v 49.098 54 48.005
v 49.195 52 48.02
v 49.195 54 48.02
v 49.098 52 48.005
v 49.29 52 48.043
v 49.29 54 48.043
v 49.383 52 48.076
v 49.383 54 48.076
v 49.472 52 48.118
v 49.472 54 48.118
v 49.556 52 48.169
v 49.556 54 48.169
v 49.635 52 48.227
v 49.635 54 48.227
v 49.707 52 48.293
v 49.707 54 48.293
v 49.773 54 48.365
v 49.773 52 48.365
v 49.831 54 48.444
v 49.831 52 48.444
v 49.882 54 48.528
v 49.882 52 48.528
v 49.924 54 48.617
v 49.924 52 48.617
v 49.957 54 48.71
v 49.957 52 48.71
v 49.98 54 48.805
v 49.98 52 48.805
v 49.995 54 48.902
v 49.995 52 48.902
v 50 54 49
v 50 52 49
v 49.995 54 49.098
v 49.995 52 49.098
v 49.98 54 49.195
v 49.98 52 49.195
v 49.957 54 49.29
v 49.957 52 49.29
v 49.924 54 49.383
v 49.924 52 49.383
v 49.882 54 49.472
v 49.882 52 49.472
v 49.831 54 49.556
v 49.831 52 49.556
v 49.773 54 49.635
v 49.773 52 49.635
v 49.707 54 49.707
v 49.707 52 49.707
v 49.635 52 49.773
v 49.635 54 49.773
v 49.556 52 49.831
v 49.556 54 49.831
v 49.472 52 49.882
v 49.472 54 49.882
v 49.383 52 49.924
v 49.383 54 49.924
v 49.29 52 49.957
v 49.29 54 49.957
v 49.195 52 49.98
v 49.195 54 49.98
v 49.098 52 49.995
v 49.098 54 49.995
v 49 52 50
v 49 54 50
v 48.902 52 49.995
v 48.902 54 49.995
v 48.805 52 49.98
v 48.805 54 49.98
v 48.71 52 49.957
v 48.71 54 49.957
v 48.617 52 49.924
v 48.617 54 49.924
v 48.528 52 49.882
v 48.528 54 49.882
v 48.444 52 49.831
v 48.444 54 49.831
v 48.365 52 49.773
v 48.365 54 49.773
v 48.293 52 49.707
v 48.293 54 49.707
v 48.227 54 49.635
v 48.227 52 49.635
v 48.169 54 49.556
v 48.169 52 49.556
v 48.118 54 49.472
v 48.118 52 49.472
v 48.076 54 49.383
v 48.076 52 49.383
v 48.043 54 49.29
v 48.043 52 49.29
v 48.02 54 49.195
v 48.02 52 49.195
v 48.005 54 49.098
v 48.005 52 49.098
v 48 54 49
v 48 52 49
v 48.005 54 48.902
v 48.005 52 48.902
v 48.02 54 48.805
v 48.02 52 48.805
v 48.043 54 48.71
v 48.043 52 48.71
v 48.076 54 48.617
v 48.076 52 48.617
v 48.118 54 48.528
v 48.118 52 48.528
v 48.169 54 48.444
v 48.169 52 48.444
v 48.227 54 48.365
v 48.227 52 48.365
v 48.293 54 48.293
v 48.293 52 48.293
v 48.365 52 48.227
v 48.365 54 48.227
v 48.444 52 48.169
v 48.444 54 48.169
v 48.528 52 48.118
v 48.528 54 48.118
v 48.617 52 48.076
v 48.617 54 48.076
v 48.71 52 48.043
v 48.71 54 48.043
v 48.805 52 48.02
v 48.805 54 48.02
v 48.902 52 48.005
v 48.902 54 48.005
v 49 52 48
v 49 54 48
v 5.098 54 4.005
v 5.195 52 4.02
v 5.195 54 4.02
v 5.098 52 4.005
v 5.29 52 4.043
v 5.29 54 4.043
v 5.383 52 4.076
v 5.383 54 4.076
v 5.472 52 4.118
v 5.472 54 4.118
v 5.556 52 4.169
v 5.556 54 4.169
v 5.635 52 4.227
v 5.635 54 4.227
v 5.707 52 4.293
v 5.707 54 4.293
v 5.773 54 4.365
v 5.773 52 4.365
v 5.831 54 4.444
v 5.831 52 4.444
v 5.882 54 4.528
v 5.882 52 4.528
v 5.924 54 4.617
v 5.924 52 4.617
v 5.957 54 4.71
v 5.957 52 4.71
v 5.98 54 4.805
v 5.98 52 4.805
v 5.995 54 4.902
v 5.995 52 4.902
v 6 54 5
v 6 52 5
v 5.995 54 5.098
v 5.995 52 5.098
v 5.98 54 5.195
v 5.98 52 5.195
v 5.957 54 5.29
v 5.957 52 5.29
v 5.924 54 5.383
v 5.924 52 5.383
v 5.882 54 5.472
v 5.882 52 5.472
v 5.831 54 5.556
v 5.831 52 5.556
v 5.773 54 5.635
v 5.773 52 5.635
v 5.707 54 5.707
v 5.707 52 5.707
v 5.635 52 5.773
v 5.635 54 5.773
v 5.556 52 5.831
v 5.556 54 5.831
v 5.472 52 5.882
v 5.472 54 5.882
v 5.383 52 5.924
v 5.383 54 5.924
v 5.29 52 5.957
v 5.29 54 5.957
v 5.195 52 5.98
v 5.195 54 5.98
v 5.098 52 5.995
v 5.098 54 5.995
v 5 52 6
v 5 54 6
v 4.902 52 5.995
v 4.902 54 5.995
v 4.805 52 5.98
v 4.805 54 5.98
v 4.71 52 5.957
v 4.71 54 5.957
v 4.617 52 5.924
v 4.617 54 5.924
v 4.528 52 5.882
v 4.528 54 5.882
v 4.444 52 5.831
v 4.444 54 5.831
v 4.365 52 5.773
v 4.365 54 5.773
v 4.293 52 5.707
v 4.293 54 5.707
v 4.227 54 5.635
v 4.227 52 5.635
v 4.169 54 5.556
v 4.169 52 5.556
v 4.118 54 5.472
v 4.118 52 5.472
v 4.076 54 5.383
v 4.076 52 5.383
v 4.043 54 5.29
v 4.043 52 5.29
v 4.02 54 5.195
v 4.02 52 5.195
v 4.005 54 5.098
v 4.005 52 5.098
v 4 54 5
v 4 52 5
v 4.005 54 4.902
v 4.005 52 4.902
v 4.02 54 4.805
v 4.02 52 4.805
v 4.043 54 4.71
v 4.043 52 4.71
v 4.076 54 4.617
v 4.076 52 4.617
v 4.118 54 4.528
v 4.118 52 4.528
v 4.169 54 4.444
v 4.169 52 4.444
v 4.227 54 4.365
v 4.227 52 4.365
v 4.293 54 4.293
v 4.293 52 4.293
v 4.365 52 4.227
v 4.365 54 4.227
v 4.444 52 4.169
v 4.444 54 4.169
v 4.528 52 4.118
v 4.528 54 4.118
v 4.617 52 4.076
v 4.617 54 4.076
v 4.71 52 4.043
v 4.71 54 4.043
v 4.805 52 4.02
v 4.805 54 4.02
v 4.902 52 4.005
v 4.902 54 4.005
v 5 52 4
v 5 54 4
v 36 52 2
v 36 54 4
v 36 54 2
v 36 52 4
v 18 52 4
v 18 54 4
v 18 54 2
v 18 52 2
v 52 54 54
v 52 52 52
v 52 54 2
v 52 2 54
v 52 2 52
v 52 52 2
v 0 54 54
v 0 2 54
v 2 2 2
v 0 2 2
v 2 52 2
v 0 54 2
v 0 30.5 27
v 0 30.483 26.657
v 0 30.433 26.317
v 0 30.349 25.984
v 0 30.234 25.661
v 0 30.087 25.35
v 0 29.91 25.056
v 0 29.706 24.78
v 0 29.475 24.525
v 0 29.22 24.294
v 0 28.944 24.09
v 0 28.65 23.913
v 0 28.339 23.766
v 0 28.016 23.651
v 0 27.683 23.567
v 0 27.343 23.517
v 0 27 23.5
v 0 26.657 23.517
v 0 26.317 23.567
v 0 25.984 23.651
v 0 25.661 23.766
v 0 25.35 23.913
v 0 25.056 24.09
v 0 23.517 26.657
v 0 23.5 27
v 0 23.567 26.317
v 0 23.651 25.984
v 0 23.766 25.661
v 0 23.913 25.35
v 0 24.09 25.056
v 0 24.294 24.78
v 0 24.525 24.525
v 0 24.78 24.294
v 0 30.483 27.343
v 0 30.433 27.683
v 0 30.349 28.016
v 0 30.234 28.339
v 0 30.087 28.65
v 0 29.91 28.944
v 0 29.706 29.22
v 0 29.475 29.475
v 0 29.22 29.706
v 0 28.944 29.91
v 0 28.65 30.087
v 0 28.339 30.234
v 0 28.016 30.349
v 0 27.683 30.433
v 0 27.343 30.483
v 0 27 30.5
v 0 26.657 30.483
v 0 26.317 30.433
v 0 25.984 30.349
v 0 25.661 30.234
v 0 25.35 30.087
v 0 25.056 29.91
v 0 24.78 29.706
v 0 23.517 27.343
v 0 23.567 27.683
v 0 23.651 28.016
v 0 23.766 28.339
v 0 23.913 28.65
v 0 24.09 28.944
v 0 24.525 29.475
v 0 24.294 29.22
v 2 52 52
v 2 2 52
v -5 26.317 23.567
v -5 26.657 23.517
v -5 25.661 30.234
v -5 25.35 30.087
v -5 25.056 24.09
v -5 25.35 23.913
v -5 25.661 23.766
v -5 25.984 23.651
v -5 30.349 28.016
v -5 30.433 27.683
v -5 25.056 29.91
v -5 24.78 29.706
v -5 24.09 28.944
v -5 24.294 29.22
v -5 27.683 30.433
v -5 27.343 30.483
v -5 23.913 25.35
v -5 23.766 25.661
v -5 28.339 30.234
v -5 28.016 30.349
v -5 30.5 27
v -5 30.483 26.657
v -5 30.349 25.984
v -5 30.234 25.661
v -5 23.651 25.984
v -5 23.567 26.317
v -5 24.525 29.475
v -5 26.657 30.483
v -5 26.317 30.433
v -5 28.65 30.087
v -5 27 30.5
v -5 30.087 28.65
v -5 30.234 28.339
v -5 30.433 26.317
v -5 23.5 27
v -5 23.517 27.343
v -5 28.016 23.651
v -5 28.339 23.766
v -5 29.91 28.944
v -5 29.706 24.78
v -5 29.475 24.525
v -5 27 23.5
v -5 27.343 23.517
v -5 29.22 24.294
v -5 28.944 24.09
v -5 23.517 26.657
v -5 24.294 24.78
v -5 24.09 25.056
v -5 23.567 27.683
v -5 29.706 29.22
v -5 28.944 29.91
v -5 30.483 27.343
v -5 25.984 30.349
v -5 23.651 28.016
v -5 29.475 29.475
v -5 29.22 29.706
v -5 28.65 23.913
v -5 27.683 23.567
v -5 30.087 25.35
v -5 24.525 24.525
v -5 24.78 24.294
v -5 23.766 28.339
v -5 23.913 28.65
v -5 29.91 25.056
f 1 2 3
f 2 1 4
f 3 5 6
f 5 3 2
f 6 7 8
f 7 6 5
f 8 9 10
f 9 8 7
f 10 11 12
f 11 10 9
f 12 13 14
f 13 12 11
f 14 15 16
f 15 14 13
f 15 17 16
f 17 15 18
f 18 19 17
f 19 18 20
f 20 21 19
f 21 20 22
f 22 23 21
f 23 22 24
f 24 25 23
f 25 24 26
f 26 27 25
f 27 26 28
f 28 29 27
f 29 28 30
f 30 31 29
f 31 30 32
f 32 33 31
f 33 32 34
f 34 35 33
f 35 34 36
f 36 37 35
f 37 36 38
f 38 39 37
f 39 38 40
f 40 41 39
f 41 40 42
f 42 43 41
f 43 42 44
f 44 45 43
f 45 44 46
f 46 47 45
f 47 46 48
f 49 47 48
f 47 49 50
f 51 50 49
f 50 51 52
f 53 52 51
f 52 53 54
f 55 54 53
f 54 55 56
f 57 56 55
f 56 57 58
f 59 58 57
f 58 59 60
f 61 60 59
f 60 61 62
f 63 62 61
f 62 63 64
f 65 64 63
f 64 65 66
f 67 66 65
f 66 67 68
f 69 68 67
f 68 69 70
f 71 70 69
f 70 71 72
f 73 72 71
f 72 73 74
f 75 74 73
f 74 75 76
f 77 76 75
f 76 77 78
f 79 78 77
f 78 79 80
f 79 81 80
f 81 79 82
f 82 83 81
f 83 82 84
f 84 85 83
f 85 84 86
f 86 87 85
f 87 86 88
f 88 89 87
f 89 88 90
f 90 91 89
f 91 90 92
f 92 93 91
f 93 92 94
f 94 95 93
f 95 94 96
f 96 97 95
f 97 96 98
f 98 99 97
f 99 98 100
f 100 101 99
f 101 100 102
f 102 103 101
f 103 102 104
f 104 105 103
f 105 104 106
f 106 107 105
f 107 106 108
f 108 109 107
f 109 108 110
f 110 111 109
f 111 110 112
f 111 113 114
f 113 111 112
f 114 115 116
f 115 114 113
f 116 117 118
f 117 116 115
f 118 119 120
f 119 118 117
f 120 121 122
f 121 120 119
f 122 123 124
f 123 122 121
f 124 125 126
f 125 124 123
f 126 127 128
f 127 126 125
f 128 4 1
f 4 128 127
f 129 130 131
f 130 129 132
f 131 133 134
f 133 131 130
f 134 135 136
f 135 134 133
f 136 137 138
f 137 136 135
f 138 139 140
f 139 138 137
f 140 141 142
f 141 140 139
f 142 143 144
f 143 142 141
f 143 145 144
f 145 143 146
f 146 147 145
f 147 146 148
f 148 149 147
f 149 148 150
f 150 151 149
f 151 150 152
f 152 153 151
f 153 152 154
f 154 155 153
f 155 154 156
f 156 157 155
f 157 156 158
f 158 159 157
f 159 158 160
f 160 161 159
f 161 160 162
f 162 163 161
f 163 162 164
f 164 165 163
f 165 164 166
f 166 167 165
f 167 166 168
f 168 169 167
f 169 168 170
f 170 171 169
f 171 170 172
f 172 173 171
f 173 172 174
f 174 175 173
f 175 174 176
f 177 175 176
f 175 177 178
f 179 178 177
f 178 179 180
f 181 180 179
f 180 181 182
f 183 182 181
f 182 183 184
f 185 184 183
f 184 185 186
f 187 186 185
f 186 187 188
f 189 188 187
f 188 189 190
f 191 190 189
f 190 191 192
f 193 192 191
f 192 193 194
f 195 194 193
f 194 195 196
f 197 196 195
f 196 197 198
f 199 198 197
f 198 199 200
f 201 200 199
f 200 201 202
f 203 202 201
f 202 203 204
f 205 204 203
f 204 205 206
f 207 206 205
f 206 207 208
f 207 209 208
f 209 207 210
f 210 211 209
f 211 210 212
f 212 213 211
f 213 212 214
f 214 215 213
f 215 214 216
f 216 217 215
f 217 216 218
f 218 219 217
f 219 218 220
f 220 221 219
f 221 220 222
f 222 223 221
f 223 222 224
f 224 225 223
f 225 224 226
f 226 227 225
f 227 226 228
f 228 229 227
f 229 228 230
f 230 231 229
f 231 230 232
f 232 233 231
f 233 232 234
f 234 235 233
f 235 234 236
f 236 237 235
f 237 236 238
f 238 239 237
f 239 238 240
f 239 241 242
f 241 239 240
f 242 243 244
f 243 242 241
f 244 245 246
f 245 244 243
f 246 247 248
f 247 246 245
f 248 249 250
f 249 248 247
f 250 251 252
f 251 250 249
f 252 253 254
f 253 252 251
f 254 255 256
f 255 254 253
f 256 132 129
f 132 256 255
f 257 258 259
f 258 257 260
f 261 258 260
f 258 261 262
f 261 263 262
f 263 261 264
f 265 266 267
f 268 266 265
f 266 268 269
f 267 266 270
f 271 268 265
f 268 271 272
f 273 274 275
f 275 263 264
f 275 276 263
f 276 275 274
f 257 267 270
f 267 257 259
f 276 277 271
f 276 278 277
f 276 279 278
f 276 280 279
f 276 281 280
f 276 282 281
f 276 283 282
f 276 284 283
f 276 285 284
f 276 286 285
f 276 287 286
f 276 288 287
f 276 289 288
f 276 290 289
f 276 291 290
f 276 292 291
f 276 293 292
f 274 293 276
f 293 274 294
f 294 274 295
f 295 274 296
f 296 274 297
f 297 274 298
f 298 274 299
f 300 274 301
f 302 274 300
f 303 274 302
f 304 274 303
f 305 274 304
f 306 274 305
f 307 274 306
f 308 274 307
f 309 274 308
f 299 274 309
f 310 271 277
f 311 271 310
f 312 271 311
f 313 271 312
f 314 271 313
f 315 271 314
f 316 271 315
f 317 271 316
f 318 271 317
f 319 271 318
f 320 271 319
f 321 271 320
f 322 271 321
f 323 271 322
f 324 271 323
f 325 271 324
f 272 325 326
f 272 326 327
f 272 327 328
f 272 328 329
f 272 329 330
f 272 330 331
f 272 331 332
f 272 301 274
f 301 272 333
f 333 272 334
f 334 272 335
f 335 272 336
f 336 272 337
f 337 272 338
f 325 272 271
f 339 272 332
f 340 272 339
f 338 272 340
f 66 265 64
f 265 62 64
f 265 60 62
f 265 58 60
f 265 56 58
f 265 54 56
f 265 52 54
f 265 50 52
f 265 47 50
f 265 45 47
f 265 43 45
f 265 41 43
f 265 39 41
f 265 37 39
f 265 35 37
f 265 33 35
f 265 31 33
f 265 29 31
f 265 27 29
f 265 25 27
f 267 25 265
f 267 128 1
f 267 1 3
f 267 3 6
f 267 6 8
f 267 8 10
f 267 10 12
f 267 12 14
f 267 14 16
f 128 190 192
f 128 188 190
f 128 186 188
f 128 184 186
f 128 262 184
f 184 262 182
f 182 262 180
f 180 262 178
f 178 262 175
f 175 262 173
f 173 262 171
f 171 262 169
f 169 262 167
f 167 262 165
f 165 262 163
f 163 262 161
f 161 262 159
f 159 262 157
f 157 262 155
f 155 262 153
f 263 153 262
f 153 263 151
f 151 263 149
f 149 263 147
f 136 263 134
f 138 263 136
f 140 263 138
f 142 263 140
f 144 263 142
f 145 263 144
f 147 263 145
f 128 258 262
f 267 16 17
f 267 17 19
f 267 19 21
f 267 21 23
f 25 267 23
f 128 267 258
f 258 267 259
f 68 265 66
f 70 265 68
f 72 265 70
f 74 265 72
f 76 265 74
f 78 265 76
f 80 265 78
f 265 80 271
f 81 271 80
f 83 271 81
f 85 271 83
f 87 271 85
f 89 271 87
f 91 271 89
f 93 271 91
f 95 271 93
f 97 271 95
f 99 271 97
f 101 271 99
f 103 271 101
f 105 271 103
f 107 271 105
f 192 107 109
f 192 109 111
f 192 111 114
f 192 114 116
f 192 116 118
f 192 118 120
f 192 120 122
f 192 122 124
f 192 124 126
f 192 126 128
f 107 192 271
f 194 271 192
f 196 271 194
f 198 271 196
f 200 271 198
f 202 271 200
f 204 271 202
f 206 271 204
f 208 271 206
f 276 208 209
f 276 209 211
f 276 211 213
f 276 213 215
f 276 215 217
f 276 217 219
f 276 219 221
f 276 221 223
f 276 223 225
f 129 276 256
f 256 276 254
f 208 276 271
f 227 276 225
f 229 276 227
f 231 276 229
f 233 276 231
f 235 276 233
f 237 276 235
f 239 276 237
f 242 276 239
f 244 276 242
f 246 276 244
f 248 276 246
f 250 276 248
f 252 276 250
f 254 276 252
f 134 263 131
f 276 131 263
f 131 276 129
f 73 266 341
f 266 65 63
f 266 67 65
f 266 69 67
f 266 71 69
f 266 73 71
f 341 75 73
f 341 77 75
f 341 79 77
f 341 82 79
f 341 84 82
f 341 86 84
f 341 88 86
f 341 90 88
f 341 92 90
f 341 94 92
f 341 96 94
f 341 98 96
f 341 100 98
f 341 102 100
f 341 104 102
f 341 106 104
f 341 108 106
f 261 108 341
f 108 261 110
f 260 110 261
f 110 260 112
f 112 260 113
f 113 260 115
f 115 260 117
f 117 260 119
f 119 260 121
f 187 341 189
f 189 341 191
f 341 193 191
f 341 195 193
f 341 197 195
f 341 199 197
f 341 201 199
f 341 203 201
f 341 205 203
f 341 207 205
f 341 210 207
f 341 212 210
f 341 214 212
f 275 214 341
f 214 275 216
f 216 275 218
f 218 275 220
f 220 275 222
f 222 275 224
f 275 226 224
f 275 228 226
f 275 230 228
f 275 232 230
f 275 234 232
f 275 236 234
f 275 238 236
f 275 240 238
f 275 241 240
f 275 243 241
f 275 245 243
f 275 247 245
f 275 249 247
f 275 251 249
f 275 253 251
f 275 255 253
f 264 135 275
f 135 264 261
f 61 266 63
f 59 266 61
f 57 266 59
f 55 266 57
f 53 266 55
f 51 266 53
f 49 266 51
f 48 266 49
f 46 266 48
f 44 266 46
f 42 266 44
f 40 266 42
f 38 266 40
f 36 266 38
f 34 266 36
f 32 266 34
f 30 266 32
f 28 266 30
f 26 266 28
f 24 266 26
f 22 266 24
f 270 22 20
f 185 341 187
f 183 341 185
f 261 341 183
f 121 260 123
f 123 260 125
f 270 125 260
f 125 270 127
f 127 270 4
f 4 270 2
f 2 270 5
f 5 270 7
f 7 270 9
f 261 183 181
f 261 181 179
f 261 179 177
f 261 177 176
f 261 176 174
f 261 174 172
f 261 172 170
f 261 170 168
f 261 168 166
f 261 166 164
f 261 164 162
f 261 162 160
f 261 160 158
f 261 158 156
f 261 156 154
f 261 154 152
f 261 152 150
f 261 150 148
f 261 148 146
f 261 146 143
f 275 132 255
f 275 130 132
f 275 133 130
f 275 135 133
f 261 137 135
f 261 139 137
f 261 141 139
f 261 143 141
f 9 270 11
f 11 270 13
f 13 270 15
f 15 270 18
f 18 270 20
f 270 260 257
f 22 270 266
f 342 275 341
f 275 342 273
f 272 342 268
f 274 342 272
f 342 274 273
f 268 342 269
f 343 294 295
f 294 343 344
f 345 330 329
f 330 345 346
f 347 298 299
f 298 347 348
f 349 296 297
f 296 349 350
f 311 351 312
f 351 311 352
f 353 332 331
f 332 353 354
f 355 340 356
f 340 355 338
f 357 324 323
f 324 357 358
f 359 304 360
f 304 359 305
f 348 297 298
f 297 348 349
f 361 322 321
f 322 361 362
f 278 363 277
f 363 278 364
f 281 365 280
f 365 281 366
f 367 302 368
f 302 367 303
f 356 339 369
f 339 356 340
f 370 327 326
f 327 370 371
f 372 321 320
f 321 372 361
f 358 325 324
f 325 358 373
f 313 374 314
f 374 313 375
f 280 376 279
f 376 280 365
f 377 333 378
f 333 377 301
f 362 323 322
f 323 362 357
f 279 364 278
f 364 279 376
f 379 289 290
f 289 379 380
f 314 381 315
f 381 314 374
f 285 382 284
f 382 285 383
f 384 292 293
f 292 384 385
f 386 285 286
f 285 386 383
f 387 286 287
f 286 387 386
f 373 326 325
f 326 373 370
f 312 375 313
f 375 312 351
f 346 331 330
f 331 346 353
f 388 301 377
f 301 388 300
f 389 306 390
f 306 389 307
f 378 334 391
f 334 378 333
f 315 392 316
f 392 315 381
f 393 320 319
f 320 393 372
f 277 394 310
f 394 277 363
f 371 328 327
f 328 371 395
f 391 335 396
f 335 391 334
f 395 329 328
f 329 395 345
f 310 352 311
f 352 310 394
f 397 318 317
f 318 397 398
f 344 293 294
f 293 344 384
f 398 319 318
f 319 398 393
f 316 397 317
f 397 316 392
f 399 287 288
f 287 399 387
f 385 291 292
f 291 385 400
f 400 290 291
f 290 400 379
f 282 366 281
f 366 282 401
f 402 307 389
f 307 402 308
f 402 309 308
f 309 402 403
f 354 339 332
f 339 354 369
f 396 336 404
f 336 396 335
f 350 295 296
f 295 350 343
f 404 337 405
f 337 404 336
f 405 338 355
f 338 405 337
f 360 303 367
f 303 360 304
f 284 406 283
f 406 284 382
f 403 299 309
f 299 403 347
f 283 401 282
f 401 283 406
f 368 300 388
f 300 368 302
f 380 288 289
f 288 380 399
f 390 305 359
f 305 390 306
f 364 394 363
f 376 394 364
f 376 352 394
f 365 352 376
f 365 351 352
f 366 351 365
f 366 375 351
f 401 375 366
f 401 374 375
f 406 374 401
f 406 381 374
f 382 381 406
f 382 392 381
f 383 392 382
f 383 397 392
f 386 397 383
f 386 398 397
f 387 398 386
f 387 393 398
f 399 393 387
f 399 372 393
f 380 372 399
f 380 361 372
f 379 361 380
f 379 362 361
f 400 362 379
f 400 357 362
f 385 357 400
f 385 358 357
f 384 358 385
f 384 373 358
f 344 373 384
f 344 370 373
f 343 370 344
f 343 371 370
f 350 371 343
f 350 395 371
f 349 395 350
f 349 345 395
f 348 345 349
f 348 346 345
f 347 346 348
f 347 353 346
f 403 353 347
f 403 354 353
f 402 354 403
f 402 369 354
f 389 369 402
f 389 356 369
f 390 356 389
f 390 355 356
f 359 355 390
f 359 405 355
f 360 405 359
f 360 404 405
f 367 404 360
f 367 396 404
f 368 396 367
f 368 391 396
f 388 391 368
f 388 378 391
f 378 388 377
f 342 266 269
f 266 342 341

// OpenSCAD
// Outer width of the "box" that contains the camera
BODY_OUT_W = 54;

// Thickness of the walls of the "box" that contains the camera
PANEL_THICK = 2;

// Margin to apply when performing differences
MARGIN = 1;

// Circles resolution
FN = 64;

// Cable hole dimensions
CABLE_HOLE_W = 18;
CABLE_HOLE_H = 2;

// Axis dimensions
AXIS_H = 5;
AXIS_R = 3.5;

// Back panel
difference () {
translate ([0, BODY_OUT_W - PANEL_THICK, PANEL_THICK]) {
    cube([BODY_OUT_W - PANEL_THICK, PANEL_THICK, BODY_OUT_W - PANEL_THICK]);
}
union () {
translate ([BODY_OUT_W / 2.0, BODY_OUT_W + MARGIN, BODY_OUT_W / 2.0]) {
rotate ([90, 0, 0]) {
linear_extrude(height = PANEL_THICK + MARGIN * 2) {
    import(file = "../drawings/camera.dxf", layer = "openscad-screws-2", $fn=FN);
}
}
}
translate ([BODY_OUT_W / 2 - CABLE_HOLE_W / 2, BODY_OUT_W - PANEL_THICK - MARGIN, PANEL_THICK - MARGIN]) {
cube ([CABLE_HOLE_W, PANEL_THICK + MARGIN * 2, CABLE_HOLE_H + MARGIN]);
}
}
}

// Left panel
translate ([0, PANEL_THICK, PANEL_THICK]) {
    cube([PANEL_THICK, BODY_OUT_W - PANEL_THICK, BODY_OUT_W - PANEL_THICK]);
}
translate ([MARGIN, BODY_OUT_W / 2, BODY_OUT_W / 2]) {
rotate ([0, -90, 0]) {
cylinder (AXIS_H + MARGIN, AXIS_R, AXIS_R, $fn=FN);
}
}

// Top panel
translate ([0, PANEL_THICK, BODY_OUT_W - PANEL_THICK]) {
cube([BODY_OUT_W - PANEL_THICK, BODY_OUT_W - PANEL_THICK, PANEL_THICK]);
}
